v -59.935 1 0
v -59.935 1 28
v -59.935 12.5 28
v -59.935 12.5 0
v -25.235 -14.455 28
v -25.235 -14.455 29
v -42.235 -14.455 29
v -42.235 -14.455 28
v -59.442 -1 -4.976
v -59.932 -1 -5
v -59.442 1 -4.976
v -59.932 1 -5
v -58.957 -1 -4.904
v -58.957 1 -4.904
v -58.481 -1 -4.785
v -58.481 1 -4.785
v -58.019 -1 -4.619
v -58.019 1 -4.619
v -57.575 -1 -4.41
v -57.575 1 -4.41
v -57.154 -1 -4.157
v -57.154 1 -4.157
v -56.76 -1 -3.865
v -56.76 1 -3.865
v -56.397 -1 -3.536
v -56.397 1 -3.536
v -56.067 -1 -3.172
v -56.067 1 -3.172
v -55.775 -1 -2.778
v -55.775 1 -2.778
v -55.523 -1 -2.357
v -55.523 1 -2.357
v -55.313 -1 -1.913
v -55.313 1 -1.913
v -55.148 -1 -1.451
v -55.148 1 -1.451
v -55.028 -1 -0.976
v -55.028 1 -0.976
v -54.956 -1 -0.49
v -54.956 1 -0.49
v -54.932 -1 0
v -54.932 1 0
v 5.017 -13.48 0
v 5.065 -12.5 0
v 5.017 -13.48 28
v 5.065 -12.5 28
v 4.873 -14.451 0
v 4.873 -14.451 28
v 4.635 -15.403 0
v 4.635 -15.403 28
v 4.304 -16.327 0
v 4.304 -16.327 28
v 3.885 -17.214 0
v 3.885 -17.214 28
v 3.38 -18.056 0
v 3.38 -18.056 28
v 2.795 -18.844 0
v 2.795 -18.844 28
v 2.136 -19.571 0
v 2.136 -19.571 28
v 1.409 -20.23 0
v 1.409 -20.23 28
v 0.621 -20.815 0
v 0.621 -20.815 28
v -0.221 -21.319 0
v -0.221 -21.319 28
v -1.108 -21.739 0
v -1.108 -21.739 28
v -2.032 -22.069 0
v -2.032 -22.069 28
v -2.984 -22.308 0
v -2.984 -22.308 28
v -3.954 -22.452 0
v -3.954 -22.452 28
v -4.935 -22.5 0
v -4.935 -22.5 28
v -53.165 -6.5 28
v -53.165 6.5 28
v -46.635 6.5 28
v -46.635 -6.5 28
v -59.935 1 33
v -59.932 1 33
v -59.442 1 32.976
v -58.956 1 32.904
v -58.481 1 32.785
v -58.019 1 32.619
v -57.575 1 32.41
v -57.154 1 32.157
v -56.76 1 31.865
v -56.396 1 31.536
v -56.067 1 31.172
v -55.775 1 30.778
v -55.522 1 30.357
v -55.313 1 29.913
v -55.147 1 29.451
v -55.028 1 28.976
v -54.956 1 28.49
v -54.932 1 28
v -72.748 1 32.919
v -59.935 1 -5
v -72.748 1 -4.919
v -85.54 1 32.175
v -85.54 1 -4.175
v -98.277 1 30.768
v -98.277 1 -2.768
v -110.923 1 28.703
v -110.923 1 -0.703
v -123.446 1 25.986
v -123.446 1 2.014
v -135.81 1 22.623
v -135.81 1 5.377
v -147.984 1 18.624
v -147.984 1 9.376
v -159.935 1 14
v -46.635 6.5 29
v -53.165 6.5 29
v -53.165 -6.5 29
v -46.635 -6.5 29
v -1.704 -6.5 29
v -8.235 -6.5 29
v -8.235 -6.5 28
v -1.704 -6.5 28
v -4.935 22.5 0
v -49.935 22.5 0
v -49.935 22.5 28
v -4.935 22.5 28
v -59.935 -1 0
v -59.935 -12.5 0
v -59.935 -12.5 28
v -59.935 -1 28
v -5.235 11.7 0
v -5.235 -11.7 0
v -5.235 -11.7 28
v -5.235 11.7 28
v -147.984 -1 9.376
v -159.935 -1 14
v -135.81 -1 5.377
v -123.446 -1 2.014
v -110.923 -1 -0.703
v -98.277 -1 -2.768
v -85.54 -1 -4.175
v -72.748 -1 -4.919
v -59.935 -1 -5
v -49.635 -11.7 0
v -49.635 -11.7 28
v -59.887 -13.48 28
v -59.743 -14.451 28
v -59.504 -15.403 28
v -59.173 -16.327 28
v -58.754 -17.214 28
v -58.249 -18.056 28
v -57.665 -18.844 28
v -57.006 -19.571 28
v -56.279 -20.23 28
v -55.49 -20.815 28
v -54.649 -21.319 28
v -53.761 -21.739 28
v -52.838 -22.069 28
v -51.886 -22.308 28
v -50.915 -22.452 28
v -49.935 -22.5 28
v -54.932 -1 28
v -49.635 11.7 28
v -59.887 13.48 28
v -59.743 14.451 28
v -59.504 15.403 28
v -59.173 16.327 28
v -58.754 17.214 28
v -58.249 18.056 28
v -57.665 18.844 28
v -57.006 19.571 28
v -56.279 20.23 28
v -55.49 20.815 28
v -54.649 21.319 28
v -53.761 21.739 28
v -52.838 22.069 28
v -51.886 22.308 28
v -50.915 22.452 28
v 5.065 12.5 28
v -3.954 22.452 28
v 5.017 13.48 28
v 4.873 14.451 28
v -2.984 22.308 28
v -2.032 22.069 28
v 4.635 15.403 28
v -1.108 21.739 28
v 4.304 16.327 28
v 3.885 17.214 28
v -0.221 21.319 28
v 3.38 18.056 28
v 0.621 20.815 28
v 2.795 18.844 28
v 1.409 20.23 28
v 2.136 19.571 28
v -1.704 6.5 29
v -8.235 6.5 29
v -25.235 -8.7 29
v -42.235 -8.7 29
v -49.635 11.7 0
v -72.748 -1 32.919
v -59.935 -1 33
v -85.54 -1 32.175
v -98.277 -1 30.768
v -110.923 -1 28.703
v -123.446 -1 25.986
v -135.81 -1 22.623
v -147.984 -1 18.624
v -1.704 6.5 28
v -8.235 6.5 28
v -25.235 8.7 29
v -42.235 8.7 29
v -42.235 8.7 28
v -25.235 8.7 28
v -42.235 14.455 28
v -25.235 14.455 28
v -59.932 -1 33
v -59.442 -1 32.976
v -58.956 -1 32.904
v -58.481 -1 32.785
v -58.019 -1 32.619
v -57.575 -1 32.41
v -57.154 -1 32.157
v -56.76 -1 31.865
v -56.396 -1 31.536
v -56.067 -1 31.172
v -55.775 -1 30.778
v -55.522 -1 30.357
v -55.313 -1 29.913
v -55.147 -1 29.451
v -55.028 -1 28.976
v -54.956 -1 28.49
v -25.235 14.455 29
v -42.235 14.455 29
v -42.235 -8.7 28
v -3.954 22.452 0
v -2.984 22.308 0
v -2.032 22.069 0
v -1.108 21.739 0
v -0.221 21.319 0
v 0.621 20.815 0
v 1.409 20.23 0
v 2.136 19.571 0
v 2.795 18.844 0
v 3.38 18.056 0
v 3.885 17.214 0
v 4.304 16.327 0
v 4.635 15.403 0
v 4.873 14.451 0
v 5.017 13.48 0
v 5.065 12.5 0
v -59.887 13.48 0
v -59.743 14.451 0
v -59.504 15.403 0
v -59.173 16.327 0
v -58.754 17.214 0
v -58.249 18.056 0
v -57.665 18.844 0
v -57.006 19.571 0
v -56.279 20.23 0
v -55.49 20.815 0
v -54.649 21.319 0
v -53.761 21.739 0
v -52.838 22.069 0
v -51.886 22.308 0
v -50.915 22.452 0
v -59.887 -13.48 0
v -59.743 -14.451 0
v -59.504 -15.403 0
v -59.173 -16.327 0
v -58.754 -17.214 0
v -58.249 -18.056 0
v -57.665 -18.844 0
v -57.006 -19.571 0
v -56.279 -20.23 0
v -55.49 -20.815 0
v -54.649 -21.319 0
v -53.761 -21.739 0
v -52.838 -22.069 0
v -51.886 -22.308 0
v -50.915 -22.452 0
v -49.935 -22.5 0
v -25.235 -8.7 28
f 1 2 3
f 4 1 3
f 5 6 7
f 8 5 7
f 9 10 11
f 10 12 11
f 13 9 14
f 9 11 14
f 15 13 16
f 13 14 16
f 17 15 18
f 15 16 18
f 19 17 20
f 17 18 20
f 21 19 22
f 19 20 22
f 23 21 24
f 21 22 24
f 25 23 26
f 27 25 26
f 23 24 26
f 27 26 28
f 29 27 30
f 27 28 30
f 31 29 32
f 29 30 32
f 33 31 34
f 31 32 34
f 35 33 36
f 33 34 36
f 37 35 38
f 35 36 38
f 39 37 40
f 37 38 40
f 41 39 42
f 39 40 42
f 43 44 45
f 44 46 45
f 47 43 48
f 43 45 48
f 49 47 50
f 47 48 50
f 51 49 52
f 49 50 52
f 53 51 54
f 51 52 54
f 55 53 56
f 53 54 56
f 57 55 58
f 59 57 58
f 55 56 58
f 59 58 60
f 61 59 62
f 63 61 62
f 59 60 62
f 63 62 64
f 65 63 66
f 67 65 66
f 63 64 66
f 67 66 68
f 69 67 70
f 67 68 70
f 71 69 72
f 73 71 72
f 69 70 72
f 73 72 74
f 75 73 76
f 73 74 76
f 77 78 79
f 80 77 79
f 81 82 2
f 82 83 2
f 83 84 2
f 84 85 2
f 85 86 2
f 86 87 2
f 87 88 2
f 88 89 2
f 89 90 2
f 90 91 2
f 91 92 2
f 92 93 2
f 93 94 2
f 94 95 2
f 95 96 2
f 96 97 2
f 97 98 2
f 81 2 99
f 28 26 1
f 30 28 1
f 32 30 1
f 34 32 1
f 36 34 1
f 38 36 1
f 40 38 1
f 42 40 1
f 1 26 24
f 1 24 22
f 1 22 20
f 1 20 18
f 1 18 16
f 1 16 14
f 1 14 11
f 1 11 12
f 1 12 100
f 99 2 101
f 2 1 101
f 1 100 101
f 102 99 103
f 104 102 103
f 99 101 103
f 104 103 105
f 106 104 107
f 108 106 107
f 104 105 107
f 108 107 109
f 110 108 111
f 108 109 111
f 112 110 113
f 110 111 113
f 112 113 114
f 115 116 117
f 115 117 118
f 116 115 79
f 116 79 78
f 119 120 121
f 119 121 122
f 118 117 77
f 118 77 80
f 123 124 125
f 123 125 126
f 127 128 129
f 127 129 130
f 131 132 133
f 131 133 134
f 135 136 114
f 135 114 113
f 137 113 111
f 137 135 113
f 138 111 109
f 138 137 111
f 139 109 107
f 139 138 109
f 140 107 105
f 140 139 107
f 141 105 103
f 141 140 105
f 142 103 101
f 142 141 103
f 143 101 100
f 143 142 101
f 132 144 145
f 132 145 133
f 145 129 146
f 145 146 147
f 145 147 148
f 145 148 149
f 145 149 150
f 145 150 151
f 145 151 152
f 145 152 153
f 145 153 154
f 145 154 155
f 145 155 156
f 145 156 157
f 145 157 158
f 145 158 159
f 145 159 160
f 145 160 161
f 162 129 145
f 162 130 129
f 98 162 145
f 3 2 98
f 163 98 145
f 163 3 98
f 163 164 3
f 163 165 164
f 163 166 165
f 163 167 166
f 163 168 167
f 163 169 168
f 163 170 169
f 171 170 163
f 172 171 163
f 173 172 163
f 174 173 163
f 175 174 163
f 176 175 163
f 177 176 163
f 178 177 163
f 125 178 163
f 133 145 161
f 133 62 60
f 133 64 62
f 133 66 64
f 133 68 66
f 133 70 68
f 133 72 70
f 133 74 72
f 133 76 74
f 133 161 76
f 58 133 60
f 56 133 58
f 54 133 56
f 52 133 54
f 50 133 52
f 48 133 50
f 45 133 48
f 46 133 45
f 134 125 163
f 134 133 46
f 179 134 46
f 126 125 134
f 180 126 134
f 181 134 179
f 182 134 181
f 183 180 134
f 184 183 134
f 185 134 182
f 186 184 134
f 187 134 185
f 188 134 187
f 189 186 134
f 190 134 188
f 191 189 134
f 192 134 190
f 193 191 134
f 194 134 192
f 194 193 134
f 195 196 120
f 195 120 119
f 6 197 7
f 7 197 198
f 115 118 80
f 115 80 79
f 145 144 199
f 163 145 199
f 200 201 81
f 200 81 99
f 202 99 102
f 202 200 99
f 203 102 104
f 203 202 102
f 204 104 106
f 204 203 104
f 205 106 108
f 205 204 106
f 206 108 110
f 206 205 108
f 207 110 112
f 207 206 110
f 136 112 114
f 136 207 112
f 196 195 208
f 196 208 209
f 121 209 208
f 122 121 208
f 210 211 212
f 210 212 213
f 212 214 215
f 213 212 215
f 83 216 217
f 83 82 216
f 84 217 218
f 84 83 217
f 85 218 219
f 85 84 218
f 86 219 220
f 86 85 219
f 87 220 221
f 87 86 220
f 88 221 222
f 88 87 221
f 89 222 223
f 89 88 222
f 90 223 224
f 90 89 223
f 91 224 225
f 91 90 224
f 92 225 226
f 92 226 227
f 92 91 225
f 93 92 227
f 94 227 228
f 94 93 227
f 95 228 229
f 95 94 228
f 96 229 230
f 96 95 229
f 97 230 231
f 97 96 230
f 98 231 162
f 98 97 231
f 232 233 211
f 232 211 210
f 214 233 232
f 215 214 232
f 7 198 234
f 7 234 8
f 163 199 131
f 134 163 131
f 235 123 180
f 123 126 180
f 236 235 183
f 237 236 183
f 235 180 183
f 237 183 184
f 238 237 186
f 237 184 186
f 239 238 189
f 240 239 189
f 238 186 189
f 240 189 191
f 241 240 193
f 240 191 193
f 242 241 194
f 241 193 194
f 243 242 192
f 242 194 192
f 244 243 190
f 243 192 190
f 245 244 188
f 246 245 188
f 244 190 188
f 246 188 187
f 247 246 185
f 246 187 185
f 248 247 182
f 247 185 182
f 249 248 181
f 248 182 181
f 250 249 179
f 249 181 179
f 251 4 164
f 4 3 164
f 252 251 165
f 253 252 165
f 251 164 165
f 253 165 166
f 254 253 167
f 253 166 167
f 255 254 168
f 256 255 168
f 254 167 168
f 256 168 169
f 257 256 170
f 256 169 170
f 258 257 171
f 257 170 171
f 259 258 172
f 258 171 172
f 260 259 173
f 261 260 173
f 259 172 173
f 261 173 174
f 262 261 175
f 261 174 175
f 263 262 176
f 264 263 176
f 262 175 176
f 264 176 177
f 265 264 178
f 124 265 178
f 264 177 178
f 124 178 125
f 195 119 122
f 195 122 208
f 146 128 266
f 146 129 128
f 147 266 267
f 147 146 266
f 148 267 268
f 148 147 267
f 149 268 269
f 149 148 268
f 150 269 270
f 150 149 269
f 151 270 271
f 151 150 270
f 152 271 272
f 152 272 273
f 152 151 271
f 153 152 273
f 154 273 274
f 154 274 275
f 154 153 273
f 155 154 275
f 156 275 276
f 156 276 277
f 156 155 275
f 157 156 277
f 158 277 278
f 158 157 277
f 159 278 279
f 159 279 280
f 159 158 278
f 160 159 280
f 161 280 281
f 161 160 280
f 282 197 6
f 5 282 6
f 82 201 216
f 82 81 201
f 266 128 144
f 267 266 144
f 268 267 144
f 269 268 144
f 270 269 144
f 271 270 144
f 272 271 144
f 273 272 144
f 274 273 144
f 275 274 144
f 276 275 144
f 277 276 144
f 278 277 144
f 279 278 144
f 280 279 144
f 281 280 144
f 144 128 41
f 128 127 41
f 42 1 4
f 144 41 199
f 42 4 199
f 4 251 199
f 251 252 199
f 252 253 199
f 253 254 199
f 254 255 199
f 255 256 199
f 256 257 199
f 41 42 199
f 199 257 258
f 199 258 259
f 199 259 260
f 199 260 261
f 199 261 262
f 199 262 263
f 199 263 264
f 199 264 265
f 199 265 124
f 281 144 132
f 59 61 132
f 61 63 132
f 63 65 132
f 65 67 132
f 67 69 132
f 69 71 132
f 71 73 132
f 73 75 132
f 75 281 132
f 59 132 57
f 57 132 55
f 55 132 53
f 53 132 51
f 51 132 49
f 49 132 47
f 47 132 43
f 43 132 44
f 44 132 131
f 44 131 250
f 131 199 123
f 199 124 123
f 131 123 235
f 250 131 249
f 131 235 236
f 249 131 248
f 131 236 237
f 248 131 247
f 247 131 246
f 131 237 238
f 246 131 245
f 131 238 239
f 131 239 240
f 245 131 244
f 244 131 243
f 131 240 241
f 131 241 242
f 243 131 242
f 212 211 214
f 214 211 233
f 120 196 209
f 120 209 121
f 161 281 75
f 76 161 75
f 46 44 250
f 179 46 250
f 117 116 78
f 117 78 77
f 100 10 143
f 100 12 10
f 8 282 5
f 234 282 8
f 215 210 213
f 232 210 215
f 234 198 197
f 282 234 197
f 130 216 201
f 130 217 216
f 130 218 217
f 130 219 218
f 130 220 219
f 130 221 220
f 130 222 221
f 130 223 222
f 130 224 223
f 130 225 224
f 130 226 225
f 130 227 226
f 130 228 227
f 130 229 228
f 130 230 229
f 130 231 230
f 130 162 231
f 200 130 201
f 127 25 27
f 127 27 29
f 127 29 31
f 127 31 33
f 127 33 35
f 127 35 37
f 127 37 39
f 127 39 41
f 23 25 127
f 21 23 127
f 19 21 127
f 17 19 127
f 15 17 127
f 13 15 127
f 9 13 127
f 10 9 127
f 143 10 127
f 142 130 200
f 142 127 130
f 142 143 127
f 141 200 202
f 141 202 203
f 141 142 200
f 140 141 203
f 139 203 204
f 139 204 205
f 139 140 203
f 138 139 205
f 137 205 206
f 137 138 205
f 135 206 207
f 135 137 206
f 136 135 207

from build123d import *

# Parameters (mm, degrees)
SKETCH_1_W           = 65
SKETCH_1_H           = 45
EXTRUDE_1_DEPTH      = 28
SKETCH_2_W           = 44.4
SKETCH_2_H           = 23.4
CUT_EXTRUDE_1_DEPTH  = 39
FILLET_1_R           = 10
FILLET_2_R           = 10
FILLET_3_R           = 10
FILLET_4_R           = 10
EXTRUDE_6_DEPTH      = 1
EXTRUDE_6_2_DEPTH    = 1
EXTRUDE_6_3_DEPTH    = 1
SKETCH_10_W          = 17
SKETCH_10_H          = 5.754584259
EXTRUDE_6_4_DEPTH    = 1
SKETCH_20_W          = 5.002637397
SKETCH_20_H          = 2
EXTRUDE_7_DEPTH      = 5
SKETCH_21_W          = 5.00232547
SKETCH_21_H          = 2
EXTRUDE_8_DEPTH      = 5
EXTRUDE_9_DEPTH      = 1
EXTRUDE_9_DEPTH_BACK = 1
FILLET_5_R           = 5
FILLET_6_R           = 5


with BuildPart() as part:
    # 草圖1 → 填料-伸長1 (new body)
    with BuildSketch(Plane.XY):
        with Locations((-27.434655272, 0)):
            Rectangle(SKETCH_1_W, SKETCH_1_H)
    extrude(amount=EXTRUDE_1_DEPTH)

    # 草圖2 → 除料-伸長1 (cut)
    with BuildSketch(Plane.XY):
        with Locations((-27.434655272, 0)):
            Rectangle(SKETCH_2_W, SKETCH_2_H)
    extrude(amount=CUT_EXTRUDE_1_DEPTH, mode=Mode.SUBTRACT)

    # 圓角1
    fillet_1_edges = [part.edges().sort_by_distance(p)[0] for p in [
        (-59.934655272, -22.5, 14),
    ]]
    fillet(fillet_1_edges, radius=FILLET_1_R)

    # 圓角2
    fillet_2_edges = [part.edges().sort_by_distance(p)[0] for p in [
        (-59.934655272, 22.5, 14),
    ]]
    fillet(fillet_2_edges, radius=FILLET_2_R)

    # 圓角3
    fillet_3_edges = [part.edges().sort_by_distance(p)[0] for p in [
        (5.065344728, 22.5, 14),
    ]]
    fillet(fillet_3_edges, radius=FILLET_3_R)

    # 圓角4
    fillet_4_edges = [part.edges().sort_by_distance(p)[0] for p in [
        (5.065344728, -22.5, 14),
    ]]
    fillet(fillet_4_edges, radius=FILLET_4_R)

    # 草圖20 → 填料-伸長7 (add)
    with BuildSketch(Plane.XY.offset(28)):
        with Locations((-57.433336574, 0)):
            Rectangle(SKETCH_20_W, SKETCH_20_H)
    extrude(amount=EXTRUDE_7_DEPTH)

    # 草圖21 → 填料-伸長8 (add)
    with BuildSketch(Plane(origin=(0, 0, 0), x_dir=(-1, 0, 0), z_dir=(0, 0, -1))):
        with Locations((57.433492537, 0)):
            Rectangle(SKETCH_21_W, SKETCH_21_H)
    extrude(amount=EXTRUDE_8_DEPTH)

    # 草圖22 → 填料-伸長9 (add, two sides: drawn at the far end of the back side and taken through both)
    with BuildSketch(Plane(origin=(0, 0, 0), x_dir=(1, 0, 0), z_dir=(0, 1, 0)).offset(-EXTRUDE_9_DEPTH_BACK)):
        with BuildLine():
            Line((-59.934655272, 5), (-59.934655272, -33))
            ThreePointArc((-59.934655272, -33), (-110.92327451, -28.70325915), (-159.934655272, -14))
            ThreePointArc((-159.934655272, -14), (-110.92327451, 0.70325915), (-59.934655272, 5))
        make_face()
    extrude(amount=EXTRUDE_9_DEPTH + EXTRUDE_9_DEPTH_BACK)

    # 圓角5
    fillet_5_edges = [part.edges().sort_by_distance(p)[0] for p in [
        (-54.932329802, 0, -5),
    ]]
    fillet(fillet_5_edges, radius=FILLET_5_R - 0.0001)  # a hair under: the kernel refuses the full size

    # 圓角6
    fillet_6_edges = [part.edges().sort_by_distance(p)[0] for p in [
        (-54.932017875, 0, 33),
    ]]
    fillet(fillet_6_edges, radius=FILLET_6_R - 0.0001)  # a hair under: the kernel refuses the full size


with BuildPart() as body_2:
    # 草圖10 → 填料-伸長6 (new body)
    with BuildSketch(Plane.XY.offset(29)):
        Polygon((-49.634655272, 6.5), (-53.165057103, 6.5), (-53.165057103, -6.5), (-46.634655272, -6.5), (-46.634655272, 6.5), align=None)
    extrude(amount=-EXTRUDE_6_DEPTH)


with BuildPart() as body_3:
    # 草圖10 → Extrude 6 2 (new body)
    with BuildSketch(Plane.XY.offset(29)):
        Polygon((-42.234655272, -11.7), (-42.234655272, -8.7), (-25.234655272, -8.7), (-25.234655272, -14.454584259), (-42.234655272, -14.454584259), align=None)
    extrude(amount=-EXTRUDE_6_2_DEPTH)


with BuildPart() as body_4:
    # 草圖10 → Extrude 6 3 (new body)
    with BuildSketch(Plane.XY.offset(29)):
        Polygon((-8.234655272, 6.5), (-8.234655272, -6.5), (-5.234655272, -6.5), (-1.70425344, -6.5), (-1.70425344, 6.5), align=None)
    extrude(amount=-EXTRUDE_6_3_DEPTH)


with BuildPart() as body_5:
    # 草圖10 → Extrude 6 4 (new body)
    with BuildSketch(Plane.XY.offset(29)):
        with Locations((-33.734655272, 11.57729213)):
            Rectangle(SKETCH_10_W, SKETCH_10_H)
    extrude(amount=-EXTRUDE_6_4_DEPTH)


solid = Compound([part.part, body_2.part, body_3.part, body_4.part, body_5.part])
